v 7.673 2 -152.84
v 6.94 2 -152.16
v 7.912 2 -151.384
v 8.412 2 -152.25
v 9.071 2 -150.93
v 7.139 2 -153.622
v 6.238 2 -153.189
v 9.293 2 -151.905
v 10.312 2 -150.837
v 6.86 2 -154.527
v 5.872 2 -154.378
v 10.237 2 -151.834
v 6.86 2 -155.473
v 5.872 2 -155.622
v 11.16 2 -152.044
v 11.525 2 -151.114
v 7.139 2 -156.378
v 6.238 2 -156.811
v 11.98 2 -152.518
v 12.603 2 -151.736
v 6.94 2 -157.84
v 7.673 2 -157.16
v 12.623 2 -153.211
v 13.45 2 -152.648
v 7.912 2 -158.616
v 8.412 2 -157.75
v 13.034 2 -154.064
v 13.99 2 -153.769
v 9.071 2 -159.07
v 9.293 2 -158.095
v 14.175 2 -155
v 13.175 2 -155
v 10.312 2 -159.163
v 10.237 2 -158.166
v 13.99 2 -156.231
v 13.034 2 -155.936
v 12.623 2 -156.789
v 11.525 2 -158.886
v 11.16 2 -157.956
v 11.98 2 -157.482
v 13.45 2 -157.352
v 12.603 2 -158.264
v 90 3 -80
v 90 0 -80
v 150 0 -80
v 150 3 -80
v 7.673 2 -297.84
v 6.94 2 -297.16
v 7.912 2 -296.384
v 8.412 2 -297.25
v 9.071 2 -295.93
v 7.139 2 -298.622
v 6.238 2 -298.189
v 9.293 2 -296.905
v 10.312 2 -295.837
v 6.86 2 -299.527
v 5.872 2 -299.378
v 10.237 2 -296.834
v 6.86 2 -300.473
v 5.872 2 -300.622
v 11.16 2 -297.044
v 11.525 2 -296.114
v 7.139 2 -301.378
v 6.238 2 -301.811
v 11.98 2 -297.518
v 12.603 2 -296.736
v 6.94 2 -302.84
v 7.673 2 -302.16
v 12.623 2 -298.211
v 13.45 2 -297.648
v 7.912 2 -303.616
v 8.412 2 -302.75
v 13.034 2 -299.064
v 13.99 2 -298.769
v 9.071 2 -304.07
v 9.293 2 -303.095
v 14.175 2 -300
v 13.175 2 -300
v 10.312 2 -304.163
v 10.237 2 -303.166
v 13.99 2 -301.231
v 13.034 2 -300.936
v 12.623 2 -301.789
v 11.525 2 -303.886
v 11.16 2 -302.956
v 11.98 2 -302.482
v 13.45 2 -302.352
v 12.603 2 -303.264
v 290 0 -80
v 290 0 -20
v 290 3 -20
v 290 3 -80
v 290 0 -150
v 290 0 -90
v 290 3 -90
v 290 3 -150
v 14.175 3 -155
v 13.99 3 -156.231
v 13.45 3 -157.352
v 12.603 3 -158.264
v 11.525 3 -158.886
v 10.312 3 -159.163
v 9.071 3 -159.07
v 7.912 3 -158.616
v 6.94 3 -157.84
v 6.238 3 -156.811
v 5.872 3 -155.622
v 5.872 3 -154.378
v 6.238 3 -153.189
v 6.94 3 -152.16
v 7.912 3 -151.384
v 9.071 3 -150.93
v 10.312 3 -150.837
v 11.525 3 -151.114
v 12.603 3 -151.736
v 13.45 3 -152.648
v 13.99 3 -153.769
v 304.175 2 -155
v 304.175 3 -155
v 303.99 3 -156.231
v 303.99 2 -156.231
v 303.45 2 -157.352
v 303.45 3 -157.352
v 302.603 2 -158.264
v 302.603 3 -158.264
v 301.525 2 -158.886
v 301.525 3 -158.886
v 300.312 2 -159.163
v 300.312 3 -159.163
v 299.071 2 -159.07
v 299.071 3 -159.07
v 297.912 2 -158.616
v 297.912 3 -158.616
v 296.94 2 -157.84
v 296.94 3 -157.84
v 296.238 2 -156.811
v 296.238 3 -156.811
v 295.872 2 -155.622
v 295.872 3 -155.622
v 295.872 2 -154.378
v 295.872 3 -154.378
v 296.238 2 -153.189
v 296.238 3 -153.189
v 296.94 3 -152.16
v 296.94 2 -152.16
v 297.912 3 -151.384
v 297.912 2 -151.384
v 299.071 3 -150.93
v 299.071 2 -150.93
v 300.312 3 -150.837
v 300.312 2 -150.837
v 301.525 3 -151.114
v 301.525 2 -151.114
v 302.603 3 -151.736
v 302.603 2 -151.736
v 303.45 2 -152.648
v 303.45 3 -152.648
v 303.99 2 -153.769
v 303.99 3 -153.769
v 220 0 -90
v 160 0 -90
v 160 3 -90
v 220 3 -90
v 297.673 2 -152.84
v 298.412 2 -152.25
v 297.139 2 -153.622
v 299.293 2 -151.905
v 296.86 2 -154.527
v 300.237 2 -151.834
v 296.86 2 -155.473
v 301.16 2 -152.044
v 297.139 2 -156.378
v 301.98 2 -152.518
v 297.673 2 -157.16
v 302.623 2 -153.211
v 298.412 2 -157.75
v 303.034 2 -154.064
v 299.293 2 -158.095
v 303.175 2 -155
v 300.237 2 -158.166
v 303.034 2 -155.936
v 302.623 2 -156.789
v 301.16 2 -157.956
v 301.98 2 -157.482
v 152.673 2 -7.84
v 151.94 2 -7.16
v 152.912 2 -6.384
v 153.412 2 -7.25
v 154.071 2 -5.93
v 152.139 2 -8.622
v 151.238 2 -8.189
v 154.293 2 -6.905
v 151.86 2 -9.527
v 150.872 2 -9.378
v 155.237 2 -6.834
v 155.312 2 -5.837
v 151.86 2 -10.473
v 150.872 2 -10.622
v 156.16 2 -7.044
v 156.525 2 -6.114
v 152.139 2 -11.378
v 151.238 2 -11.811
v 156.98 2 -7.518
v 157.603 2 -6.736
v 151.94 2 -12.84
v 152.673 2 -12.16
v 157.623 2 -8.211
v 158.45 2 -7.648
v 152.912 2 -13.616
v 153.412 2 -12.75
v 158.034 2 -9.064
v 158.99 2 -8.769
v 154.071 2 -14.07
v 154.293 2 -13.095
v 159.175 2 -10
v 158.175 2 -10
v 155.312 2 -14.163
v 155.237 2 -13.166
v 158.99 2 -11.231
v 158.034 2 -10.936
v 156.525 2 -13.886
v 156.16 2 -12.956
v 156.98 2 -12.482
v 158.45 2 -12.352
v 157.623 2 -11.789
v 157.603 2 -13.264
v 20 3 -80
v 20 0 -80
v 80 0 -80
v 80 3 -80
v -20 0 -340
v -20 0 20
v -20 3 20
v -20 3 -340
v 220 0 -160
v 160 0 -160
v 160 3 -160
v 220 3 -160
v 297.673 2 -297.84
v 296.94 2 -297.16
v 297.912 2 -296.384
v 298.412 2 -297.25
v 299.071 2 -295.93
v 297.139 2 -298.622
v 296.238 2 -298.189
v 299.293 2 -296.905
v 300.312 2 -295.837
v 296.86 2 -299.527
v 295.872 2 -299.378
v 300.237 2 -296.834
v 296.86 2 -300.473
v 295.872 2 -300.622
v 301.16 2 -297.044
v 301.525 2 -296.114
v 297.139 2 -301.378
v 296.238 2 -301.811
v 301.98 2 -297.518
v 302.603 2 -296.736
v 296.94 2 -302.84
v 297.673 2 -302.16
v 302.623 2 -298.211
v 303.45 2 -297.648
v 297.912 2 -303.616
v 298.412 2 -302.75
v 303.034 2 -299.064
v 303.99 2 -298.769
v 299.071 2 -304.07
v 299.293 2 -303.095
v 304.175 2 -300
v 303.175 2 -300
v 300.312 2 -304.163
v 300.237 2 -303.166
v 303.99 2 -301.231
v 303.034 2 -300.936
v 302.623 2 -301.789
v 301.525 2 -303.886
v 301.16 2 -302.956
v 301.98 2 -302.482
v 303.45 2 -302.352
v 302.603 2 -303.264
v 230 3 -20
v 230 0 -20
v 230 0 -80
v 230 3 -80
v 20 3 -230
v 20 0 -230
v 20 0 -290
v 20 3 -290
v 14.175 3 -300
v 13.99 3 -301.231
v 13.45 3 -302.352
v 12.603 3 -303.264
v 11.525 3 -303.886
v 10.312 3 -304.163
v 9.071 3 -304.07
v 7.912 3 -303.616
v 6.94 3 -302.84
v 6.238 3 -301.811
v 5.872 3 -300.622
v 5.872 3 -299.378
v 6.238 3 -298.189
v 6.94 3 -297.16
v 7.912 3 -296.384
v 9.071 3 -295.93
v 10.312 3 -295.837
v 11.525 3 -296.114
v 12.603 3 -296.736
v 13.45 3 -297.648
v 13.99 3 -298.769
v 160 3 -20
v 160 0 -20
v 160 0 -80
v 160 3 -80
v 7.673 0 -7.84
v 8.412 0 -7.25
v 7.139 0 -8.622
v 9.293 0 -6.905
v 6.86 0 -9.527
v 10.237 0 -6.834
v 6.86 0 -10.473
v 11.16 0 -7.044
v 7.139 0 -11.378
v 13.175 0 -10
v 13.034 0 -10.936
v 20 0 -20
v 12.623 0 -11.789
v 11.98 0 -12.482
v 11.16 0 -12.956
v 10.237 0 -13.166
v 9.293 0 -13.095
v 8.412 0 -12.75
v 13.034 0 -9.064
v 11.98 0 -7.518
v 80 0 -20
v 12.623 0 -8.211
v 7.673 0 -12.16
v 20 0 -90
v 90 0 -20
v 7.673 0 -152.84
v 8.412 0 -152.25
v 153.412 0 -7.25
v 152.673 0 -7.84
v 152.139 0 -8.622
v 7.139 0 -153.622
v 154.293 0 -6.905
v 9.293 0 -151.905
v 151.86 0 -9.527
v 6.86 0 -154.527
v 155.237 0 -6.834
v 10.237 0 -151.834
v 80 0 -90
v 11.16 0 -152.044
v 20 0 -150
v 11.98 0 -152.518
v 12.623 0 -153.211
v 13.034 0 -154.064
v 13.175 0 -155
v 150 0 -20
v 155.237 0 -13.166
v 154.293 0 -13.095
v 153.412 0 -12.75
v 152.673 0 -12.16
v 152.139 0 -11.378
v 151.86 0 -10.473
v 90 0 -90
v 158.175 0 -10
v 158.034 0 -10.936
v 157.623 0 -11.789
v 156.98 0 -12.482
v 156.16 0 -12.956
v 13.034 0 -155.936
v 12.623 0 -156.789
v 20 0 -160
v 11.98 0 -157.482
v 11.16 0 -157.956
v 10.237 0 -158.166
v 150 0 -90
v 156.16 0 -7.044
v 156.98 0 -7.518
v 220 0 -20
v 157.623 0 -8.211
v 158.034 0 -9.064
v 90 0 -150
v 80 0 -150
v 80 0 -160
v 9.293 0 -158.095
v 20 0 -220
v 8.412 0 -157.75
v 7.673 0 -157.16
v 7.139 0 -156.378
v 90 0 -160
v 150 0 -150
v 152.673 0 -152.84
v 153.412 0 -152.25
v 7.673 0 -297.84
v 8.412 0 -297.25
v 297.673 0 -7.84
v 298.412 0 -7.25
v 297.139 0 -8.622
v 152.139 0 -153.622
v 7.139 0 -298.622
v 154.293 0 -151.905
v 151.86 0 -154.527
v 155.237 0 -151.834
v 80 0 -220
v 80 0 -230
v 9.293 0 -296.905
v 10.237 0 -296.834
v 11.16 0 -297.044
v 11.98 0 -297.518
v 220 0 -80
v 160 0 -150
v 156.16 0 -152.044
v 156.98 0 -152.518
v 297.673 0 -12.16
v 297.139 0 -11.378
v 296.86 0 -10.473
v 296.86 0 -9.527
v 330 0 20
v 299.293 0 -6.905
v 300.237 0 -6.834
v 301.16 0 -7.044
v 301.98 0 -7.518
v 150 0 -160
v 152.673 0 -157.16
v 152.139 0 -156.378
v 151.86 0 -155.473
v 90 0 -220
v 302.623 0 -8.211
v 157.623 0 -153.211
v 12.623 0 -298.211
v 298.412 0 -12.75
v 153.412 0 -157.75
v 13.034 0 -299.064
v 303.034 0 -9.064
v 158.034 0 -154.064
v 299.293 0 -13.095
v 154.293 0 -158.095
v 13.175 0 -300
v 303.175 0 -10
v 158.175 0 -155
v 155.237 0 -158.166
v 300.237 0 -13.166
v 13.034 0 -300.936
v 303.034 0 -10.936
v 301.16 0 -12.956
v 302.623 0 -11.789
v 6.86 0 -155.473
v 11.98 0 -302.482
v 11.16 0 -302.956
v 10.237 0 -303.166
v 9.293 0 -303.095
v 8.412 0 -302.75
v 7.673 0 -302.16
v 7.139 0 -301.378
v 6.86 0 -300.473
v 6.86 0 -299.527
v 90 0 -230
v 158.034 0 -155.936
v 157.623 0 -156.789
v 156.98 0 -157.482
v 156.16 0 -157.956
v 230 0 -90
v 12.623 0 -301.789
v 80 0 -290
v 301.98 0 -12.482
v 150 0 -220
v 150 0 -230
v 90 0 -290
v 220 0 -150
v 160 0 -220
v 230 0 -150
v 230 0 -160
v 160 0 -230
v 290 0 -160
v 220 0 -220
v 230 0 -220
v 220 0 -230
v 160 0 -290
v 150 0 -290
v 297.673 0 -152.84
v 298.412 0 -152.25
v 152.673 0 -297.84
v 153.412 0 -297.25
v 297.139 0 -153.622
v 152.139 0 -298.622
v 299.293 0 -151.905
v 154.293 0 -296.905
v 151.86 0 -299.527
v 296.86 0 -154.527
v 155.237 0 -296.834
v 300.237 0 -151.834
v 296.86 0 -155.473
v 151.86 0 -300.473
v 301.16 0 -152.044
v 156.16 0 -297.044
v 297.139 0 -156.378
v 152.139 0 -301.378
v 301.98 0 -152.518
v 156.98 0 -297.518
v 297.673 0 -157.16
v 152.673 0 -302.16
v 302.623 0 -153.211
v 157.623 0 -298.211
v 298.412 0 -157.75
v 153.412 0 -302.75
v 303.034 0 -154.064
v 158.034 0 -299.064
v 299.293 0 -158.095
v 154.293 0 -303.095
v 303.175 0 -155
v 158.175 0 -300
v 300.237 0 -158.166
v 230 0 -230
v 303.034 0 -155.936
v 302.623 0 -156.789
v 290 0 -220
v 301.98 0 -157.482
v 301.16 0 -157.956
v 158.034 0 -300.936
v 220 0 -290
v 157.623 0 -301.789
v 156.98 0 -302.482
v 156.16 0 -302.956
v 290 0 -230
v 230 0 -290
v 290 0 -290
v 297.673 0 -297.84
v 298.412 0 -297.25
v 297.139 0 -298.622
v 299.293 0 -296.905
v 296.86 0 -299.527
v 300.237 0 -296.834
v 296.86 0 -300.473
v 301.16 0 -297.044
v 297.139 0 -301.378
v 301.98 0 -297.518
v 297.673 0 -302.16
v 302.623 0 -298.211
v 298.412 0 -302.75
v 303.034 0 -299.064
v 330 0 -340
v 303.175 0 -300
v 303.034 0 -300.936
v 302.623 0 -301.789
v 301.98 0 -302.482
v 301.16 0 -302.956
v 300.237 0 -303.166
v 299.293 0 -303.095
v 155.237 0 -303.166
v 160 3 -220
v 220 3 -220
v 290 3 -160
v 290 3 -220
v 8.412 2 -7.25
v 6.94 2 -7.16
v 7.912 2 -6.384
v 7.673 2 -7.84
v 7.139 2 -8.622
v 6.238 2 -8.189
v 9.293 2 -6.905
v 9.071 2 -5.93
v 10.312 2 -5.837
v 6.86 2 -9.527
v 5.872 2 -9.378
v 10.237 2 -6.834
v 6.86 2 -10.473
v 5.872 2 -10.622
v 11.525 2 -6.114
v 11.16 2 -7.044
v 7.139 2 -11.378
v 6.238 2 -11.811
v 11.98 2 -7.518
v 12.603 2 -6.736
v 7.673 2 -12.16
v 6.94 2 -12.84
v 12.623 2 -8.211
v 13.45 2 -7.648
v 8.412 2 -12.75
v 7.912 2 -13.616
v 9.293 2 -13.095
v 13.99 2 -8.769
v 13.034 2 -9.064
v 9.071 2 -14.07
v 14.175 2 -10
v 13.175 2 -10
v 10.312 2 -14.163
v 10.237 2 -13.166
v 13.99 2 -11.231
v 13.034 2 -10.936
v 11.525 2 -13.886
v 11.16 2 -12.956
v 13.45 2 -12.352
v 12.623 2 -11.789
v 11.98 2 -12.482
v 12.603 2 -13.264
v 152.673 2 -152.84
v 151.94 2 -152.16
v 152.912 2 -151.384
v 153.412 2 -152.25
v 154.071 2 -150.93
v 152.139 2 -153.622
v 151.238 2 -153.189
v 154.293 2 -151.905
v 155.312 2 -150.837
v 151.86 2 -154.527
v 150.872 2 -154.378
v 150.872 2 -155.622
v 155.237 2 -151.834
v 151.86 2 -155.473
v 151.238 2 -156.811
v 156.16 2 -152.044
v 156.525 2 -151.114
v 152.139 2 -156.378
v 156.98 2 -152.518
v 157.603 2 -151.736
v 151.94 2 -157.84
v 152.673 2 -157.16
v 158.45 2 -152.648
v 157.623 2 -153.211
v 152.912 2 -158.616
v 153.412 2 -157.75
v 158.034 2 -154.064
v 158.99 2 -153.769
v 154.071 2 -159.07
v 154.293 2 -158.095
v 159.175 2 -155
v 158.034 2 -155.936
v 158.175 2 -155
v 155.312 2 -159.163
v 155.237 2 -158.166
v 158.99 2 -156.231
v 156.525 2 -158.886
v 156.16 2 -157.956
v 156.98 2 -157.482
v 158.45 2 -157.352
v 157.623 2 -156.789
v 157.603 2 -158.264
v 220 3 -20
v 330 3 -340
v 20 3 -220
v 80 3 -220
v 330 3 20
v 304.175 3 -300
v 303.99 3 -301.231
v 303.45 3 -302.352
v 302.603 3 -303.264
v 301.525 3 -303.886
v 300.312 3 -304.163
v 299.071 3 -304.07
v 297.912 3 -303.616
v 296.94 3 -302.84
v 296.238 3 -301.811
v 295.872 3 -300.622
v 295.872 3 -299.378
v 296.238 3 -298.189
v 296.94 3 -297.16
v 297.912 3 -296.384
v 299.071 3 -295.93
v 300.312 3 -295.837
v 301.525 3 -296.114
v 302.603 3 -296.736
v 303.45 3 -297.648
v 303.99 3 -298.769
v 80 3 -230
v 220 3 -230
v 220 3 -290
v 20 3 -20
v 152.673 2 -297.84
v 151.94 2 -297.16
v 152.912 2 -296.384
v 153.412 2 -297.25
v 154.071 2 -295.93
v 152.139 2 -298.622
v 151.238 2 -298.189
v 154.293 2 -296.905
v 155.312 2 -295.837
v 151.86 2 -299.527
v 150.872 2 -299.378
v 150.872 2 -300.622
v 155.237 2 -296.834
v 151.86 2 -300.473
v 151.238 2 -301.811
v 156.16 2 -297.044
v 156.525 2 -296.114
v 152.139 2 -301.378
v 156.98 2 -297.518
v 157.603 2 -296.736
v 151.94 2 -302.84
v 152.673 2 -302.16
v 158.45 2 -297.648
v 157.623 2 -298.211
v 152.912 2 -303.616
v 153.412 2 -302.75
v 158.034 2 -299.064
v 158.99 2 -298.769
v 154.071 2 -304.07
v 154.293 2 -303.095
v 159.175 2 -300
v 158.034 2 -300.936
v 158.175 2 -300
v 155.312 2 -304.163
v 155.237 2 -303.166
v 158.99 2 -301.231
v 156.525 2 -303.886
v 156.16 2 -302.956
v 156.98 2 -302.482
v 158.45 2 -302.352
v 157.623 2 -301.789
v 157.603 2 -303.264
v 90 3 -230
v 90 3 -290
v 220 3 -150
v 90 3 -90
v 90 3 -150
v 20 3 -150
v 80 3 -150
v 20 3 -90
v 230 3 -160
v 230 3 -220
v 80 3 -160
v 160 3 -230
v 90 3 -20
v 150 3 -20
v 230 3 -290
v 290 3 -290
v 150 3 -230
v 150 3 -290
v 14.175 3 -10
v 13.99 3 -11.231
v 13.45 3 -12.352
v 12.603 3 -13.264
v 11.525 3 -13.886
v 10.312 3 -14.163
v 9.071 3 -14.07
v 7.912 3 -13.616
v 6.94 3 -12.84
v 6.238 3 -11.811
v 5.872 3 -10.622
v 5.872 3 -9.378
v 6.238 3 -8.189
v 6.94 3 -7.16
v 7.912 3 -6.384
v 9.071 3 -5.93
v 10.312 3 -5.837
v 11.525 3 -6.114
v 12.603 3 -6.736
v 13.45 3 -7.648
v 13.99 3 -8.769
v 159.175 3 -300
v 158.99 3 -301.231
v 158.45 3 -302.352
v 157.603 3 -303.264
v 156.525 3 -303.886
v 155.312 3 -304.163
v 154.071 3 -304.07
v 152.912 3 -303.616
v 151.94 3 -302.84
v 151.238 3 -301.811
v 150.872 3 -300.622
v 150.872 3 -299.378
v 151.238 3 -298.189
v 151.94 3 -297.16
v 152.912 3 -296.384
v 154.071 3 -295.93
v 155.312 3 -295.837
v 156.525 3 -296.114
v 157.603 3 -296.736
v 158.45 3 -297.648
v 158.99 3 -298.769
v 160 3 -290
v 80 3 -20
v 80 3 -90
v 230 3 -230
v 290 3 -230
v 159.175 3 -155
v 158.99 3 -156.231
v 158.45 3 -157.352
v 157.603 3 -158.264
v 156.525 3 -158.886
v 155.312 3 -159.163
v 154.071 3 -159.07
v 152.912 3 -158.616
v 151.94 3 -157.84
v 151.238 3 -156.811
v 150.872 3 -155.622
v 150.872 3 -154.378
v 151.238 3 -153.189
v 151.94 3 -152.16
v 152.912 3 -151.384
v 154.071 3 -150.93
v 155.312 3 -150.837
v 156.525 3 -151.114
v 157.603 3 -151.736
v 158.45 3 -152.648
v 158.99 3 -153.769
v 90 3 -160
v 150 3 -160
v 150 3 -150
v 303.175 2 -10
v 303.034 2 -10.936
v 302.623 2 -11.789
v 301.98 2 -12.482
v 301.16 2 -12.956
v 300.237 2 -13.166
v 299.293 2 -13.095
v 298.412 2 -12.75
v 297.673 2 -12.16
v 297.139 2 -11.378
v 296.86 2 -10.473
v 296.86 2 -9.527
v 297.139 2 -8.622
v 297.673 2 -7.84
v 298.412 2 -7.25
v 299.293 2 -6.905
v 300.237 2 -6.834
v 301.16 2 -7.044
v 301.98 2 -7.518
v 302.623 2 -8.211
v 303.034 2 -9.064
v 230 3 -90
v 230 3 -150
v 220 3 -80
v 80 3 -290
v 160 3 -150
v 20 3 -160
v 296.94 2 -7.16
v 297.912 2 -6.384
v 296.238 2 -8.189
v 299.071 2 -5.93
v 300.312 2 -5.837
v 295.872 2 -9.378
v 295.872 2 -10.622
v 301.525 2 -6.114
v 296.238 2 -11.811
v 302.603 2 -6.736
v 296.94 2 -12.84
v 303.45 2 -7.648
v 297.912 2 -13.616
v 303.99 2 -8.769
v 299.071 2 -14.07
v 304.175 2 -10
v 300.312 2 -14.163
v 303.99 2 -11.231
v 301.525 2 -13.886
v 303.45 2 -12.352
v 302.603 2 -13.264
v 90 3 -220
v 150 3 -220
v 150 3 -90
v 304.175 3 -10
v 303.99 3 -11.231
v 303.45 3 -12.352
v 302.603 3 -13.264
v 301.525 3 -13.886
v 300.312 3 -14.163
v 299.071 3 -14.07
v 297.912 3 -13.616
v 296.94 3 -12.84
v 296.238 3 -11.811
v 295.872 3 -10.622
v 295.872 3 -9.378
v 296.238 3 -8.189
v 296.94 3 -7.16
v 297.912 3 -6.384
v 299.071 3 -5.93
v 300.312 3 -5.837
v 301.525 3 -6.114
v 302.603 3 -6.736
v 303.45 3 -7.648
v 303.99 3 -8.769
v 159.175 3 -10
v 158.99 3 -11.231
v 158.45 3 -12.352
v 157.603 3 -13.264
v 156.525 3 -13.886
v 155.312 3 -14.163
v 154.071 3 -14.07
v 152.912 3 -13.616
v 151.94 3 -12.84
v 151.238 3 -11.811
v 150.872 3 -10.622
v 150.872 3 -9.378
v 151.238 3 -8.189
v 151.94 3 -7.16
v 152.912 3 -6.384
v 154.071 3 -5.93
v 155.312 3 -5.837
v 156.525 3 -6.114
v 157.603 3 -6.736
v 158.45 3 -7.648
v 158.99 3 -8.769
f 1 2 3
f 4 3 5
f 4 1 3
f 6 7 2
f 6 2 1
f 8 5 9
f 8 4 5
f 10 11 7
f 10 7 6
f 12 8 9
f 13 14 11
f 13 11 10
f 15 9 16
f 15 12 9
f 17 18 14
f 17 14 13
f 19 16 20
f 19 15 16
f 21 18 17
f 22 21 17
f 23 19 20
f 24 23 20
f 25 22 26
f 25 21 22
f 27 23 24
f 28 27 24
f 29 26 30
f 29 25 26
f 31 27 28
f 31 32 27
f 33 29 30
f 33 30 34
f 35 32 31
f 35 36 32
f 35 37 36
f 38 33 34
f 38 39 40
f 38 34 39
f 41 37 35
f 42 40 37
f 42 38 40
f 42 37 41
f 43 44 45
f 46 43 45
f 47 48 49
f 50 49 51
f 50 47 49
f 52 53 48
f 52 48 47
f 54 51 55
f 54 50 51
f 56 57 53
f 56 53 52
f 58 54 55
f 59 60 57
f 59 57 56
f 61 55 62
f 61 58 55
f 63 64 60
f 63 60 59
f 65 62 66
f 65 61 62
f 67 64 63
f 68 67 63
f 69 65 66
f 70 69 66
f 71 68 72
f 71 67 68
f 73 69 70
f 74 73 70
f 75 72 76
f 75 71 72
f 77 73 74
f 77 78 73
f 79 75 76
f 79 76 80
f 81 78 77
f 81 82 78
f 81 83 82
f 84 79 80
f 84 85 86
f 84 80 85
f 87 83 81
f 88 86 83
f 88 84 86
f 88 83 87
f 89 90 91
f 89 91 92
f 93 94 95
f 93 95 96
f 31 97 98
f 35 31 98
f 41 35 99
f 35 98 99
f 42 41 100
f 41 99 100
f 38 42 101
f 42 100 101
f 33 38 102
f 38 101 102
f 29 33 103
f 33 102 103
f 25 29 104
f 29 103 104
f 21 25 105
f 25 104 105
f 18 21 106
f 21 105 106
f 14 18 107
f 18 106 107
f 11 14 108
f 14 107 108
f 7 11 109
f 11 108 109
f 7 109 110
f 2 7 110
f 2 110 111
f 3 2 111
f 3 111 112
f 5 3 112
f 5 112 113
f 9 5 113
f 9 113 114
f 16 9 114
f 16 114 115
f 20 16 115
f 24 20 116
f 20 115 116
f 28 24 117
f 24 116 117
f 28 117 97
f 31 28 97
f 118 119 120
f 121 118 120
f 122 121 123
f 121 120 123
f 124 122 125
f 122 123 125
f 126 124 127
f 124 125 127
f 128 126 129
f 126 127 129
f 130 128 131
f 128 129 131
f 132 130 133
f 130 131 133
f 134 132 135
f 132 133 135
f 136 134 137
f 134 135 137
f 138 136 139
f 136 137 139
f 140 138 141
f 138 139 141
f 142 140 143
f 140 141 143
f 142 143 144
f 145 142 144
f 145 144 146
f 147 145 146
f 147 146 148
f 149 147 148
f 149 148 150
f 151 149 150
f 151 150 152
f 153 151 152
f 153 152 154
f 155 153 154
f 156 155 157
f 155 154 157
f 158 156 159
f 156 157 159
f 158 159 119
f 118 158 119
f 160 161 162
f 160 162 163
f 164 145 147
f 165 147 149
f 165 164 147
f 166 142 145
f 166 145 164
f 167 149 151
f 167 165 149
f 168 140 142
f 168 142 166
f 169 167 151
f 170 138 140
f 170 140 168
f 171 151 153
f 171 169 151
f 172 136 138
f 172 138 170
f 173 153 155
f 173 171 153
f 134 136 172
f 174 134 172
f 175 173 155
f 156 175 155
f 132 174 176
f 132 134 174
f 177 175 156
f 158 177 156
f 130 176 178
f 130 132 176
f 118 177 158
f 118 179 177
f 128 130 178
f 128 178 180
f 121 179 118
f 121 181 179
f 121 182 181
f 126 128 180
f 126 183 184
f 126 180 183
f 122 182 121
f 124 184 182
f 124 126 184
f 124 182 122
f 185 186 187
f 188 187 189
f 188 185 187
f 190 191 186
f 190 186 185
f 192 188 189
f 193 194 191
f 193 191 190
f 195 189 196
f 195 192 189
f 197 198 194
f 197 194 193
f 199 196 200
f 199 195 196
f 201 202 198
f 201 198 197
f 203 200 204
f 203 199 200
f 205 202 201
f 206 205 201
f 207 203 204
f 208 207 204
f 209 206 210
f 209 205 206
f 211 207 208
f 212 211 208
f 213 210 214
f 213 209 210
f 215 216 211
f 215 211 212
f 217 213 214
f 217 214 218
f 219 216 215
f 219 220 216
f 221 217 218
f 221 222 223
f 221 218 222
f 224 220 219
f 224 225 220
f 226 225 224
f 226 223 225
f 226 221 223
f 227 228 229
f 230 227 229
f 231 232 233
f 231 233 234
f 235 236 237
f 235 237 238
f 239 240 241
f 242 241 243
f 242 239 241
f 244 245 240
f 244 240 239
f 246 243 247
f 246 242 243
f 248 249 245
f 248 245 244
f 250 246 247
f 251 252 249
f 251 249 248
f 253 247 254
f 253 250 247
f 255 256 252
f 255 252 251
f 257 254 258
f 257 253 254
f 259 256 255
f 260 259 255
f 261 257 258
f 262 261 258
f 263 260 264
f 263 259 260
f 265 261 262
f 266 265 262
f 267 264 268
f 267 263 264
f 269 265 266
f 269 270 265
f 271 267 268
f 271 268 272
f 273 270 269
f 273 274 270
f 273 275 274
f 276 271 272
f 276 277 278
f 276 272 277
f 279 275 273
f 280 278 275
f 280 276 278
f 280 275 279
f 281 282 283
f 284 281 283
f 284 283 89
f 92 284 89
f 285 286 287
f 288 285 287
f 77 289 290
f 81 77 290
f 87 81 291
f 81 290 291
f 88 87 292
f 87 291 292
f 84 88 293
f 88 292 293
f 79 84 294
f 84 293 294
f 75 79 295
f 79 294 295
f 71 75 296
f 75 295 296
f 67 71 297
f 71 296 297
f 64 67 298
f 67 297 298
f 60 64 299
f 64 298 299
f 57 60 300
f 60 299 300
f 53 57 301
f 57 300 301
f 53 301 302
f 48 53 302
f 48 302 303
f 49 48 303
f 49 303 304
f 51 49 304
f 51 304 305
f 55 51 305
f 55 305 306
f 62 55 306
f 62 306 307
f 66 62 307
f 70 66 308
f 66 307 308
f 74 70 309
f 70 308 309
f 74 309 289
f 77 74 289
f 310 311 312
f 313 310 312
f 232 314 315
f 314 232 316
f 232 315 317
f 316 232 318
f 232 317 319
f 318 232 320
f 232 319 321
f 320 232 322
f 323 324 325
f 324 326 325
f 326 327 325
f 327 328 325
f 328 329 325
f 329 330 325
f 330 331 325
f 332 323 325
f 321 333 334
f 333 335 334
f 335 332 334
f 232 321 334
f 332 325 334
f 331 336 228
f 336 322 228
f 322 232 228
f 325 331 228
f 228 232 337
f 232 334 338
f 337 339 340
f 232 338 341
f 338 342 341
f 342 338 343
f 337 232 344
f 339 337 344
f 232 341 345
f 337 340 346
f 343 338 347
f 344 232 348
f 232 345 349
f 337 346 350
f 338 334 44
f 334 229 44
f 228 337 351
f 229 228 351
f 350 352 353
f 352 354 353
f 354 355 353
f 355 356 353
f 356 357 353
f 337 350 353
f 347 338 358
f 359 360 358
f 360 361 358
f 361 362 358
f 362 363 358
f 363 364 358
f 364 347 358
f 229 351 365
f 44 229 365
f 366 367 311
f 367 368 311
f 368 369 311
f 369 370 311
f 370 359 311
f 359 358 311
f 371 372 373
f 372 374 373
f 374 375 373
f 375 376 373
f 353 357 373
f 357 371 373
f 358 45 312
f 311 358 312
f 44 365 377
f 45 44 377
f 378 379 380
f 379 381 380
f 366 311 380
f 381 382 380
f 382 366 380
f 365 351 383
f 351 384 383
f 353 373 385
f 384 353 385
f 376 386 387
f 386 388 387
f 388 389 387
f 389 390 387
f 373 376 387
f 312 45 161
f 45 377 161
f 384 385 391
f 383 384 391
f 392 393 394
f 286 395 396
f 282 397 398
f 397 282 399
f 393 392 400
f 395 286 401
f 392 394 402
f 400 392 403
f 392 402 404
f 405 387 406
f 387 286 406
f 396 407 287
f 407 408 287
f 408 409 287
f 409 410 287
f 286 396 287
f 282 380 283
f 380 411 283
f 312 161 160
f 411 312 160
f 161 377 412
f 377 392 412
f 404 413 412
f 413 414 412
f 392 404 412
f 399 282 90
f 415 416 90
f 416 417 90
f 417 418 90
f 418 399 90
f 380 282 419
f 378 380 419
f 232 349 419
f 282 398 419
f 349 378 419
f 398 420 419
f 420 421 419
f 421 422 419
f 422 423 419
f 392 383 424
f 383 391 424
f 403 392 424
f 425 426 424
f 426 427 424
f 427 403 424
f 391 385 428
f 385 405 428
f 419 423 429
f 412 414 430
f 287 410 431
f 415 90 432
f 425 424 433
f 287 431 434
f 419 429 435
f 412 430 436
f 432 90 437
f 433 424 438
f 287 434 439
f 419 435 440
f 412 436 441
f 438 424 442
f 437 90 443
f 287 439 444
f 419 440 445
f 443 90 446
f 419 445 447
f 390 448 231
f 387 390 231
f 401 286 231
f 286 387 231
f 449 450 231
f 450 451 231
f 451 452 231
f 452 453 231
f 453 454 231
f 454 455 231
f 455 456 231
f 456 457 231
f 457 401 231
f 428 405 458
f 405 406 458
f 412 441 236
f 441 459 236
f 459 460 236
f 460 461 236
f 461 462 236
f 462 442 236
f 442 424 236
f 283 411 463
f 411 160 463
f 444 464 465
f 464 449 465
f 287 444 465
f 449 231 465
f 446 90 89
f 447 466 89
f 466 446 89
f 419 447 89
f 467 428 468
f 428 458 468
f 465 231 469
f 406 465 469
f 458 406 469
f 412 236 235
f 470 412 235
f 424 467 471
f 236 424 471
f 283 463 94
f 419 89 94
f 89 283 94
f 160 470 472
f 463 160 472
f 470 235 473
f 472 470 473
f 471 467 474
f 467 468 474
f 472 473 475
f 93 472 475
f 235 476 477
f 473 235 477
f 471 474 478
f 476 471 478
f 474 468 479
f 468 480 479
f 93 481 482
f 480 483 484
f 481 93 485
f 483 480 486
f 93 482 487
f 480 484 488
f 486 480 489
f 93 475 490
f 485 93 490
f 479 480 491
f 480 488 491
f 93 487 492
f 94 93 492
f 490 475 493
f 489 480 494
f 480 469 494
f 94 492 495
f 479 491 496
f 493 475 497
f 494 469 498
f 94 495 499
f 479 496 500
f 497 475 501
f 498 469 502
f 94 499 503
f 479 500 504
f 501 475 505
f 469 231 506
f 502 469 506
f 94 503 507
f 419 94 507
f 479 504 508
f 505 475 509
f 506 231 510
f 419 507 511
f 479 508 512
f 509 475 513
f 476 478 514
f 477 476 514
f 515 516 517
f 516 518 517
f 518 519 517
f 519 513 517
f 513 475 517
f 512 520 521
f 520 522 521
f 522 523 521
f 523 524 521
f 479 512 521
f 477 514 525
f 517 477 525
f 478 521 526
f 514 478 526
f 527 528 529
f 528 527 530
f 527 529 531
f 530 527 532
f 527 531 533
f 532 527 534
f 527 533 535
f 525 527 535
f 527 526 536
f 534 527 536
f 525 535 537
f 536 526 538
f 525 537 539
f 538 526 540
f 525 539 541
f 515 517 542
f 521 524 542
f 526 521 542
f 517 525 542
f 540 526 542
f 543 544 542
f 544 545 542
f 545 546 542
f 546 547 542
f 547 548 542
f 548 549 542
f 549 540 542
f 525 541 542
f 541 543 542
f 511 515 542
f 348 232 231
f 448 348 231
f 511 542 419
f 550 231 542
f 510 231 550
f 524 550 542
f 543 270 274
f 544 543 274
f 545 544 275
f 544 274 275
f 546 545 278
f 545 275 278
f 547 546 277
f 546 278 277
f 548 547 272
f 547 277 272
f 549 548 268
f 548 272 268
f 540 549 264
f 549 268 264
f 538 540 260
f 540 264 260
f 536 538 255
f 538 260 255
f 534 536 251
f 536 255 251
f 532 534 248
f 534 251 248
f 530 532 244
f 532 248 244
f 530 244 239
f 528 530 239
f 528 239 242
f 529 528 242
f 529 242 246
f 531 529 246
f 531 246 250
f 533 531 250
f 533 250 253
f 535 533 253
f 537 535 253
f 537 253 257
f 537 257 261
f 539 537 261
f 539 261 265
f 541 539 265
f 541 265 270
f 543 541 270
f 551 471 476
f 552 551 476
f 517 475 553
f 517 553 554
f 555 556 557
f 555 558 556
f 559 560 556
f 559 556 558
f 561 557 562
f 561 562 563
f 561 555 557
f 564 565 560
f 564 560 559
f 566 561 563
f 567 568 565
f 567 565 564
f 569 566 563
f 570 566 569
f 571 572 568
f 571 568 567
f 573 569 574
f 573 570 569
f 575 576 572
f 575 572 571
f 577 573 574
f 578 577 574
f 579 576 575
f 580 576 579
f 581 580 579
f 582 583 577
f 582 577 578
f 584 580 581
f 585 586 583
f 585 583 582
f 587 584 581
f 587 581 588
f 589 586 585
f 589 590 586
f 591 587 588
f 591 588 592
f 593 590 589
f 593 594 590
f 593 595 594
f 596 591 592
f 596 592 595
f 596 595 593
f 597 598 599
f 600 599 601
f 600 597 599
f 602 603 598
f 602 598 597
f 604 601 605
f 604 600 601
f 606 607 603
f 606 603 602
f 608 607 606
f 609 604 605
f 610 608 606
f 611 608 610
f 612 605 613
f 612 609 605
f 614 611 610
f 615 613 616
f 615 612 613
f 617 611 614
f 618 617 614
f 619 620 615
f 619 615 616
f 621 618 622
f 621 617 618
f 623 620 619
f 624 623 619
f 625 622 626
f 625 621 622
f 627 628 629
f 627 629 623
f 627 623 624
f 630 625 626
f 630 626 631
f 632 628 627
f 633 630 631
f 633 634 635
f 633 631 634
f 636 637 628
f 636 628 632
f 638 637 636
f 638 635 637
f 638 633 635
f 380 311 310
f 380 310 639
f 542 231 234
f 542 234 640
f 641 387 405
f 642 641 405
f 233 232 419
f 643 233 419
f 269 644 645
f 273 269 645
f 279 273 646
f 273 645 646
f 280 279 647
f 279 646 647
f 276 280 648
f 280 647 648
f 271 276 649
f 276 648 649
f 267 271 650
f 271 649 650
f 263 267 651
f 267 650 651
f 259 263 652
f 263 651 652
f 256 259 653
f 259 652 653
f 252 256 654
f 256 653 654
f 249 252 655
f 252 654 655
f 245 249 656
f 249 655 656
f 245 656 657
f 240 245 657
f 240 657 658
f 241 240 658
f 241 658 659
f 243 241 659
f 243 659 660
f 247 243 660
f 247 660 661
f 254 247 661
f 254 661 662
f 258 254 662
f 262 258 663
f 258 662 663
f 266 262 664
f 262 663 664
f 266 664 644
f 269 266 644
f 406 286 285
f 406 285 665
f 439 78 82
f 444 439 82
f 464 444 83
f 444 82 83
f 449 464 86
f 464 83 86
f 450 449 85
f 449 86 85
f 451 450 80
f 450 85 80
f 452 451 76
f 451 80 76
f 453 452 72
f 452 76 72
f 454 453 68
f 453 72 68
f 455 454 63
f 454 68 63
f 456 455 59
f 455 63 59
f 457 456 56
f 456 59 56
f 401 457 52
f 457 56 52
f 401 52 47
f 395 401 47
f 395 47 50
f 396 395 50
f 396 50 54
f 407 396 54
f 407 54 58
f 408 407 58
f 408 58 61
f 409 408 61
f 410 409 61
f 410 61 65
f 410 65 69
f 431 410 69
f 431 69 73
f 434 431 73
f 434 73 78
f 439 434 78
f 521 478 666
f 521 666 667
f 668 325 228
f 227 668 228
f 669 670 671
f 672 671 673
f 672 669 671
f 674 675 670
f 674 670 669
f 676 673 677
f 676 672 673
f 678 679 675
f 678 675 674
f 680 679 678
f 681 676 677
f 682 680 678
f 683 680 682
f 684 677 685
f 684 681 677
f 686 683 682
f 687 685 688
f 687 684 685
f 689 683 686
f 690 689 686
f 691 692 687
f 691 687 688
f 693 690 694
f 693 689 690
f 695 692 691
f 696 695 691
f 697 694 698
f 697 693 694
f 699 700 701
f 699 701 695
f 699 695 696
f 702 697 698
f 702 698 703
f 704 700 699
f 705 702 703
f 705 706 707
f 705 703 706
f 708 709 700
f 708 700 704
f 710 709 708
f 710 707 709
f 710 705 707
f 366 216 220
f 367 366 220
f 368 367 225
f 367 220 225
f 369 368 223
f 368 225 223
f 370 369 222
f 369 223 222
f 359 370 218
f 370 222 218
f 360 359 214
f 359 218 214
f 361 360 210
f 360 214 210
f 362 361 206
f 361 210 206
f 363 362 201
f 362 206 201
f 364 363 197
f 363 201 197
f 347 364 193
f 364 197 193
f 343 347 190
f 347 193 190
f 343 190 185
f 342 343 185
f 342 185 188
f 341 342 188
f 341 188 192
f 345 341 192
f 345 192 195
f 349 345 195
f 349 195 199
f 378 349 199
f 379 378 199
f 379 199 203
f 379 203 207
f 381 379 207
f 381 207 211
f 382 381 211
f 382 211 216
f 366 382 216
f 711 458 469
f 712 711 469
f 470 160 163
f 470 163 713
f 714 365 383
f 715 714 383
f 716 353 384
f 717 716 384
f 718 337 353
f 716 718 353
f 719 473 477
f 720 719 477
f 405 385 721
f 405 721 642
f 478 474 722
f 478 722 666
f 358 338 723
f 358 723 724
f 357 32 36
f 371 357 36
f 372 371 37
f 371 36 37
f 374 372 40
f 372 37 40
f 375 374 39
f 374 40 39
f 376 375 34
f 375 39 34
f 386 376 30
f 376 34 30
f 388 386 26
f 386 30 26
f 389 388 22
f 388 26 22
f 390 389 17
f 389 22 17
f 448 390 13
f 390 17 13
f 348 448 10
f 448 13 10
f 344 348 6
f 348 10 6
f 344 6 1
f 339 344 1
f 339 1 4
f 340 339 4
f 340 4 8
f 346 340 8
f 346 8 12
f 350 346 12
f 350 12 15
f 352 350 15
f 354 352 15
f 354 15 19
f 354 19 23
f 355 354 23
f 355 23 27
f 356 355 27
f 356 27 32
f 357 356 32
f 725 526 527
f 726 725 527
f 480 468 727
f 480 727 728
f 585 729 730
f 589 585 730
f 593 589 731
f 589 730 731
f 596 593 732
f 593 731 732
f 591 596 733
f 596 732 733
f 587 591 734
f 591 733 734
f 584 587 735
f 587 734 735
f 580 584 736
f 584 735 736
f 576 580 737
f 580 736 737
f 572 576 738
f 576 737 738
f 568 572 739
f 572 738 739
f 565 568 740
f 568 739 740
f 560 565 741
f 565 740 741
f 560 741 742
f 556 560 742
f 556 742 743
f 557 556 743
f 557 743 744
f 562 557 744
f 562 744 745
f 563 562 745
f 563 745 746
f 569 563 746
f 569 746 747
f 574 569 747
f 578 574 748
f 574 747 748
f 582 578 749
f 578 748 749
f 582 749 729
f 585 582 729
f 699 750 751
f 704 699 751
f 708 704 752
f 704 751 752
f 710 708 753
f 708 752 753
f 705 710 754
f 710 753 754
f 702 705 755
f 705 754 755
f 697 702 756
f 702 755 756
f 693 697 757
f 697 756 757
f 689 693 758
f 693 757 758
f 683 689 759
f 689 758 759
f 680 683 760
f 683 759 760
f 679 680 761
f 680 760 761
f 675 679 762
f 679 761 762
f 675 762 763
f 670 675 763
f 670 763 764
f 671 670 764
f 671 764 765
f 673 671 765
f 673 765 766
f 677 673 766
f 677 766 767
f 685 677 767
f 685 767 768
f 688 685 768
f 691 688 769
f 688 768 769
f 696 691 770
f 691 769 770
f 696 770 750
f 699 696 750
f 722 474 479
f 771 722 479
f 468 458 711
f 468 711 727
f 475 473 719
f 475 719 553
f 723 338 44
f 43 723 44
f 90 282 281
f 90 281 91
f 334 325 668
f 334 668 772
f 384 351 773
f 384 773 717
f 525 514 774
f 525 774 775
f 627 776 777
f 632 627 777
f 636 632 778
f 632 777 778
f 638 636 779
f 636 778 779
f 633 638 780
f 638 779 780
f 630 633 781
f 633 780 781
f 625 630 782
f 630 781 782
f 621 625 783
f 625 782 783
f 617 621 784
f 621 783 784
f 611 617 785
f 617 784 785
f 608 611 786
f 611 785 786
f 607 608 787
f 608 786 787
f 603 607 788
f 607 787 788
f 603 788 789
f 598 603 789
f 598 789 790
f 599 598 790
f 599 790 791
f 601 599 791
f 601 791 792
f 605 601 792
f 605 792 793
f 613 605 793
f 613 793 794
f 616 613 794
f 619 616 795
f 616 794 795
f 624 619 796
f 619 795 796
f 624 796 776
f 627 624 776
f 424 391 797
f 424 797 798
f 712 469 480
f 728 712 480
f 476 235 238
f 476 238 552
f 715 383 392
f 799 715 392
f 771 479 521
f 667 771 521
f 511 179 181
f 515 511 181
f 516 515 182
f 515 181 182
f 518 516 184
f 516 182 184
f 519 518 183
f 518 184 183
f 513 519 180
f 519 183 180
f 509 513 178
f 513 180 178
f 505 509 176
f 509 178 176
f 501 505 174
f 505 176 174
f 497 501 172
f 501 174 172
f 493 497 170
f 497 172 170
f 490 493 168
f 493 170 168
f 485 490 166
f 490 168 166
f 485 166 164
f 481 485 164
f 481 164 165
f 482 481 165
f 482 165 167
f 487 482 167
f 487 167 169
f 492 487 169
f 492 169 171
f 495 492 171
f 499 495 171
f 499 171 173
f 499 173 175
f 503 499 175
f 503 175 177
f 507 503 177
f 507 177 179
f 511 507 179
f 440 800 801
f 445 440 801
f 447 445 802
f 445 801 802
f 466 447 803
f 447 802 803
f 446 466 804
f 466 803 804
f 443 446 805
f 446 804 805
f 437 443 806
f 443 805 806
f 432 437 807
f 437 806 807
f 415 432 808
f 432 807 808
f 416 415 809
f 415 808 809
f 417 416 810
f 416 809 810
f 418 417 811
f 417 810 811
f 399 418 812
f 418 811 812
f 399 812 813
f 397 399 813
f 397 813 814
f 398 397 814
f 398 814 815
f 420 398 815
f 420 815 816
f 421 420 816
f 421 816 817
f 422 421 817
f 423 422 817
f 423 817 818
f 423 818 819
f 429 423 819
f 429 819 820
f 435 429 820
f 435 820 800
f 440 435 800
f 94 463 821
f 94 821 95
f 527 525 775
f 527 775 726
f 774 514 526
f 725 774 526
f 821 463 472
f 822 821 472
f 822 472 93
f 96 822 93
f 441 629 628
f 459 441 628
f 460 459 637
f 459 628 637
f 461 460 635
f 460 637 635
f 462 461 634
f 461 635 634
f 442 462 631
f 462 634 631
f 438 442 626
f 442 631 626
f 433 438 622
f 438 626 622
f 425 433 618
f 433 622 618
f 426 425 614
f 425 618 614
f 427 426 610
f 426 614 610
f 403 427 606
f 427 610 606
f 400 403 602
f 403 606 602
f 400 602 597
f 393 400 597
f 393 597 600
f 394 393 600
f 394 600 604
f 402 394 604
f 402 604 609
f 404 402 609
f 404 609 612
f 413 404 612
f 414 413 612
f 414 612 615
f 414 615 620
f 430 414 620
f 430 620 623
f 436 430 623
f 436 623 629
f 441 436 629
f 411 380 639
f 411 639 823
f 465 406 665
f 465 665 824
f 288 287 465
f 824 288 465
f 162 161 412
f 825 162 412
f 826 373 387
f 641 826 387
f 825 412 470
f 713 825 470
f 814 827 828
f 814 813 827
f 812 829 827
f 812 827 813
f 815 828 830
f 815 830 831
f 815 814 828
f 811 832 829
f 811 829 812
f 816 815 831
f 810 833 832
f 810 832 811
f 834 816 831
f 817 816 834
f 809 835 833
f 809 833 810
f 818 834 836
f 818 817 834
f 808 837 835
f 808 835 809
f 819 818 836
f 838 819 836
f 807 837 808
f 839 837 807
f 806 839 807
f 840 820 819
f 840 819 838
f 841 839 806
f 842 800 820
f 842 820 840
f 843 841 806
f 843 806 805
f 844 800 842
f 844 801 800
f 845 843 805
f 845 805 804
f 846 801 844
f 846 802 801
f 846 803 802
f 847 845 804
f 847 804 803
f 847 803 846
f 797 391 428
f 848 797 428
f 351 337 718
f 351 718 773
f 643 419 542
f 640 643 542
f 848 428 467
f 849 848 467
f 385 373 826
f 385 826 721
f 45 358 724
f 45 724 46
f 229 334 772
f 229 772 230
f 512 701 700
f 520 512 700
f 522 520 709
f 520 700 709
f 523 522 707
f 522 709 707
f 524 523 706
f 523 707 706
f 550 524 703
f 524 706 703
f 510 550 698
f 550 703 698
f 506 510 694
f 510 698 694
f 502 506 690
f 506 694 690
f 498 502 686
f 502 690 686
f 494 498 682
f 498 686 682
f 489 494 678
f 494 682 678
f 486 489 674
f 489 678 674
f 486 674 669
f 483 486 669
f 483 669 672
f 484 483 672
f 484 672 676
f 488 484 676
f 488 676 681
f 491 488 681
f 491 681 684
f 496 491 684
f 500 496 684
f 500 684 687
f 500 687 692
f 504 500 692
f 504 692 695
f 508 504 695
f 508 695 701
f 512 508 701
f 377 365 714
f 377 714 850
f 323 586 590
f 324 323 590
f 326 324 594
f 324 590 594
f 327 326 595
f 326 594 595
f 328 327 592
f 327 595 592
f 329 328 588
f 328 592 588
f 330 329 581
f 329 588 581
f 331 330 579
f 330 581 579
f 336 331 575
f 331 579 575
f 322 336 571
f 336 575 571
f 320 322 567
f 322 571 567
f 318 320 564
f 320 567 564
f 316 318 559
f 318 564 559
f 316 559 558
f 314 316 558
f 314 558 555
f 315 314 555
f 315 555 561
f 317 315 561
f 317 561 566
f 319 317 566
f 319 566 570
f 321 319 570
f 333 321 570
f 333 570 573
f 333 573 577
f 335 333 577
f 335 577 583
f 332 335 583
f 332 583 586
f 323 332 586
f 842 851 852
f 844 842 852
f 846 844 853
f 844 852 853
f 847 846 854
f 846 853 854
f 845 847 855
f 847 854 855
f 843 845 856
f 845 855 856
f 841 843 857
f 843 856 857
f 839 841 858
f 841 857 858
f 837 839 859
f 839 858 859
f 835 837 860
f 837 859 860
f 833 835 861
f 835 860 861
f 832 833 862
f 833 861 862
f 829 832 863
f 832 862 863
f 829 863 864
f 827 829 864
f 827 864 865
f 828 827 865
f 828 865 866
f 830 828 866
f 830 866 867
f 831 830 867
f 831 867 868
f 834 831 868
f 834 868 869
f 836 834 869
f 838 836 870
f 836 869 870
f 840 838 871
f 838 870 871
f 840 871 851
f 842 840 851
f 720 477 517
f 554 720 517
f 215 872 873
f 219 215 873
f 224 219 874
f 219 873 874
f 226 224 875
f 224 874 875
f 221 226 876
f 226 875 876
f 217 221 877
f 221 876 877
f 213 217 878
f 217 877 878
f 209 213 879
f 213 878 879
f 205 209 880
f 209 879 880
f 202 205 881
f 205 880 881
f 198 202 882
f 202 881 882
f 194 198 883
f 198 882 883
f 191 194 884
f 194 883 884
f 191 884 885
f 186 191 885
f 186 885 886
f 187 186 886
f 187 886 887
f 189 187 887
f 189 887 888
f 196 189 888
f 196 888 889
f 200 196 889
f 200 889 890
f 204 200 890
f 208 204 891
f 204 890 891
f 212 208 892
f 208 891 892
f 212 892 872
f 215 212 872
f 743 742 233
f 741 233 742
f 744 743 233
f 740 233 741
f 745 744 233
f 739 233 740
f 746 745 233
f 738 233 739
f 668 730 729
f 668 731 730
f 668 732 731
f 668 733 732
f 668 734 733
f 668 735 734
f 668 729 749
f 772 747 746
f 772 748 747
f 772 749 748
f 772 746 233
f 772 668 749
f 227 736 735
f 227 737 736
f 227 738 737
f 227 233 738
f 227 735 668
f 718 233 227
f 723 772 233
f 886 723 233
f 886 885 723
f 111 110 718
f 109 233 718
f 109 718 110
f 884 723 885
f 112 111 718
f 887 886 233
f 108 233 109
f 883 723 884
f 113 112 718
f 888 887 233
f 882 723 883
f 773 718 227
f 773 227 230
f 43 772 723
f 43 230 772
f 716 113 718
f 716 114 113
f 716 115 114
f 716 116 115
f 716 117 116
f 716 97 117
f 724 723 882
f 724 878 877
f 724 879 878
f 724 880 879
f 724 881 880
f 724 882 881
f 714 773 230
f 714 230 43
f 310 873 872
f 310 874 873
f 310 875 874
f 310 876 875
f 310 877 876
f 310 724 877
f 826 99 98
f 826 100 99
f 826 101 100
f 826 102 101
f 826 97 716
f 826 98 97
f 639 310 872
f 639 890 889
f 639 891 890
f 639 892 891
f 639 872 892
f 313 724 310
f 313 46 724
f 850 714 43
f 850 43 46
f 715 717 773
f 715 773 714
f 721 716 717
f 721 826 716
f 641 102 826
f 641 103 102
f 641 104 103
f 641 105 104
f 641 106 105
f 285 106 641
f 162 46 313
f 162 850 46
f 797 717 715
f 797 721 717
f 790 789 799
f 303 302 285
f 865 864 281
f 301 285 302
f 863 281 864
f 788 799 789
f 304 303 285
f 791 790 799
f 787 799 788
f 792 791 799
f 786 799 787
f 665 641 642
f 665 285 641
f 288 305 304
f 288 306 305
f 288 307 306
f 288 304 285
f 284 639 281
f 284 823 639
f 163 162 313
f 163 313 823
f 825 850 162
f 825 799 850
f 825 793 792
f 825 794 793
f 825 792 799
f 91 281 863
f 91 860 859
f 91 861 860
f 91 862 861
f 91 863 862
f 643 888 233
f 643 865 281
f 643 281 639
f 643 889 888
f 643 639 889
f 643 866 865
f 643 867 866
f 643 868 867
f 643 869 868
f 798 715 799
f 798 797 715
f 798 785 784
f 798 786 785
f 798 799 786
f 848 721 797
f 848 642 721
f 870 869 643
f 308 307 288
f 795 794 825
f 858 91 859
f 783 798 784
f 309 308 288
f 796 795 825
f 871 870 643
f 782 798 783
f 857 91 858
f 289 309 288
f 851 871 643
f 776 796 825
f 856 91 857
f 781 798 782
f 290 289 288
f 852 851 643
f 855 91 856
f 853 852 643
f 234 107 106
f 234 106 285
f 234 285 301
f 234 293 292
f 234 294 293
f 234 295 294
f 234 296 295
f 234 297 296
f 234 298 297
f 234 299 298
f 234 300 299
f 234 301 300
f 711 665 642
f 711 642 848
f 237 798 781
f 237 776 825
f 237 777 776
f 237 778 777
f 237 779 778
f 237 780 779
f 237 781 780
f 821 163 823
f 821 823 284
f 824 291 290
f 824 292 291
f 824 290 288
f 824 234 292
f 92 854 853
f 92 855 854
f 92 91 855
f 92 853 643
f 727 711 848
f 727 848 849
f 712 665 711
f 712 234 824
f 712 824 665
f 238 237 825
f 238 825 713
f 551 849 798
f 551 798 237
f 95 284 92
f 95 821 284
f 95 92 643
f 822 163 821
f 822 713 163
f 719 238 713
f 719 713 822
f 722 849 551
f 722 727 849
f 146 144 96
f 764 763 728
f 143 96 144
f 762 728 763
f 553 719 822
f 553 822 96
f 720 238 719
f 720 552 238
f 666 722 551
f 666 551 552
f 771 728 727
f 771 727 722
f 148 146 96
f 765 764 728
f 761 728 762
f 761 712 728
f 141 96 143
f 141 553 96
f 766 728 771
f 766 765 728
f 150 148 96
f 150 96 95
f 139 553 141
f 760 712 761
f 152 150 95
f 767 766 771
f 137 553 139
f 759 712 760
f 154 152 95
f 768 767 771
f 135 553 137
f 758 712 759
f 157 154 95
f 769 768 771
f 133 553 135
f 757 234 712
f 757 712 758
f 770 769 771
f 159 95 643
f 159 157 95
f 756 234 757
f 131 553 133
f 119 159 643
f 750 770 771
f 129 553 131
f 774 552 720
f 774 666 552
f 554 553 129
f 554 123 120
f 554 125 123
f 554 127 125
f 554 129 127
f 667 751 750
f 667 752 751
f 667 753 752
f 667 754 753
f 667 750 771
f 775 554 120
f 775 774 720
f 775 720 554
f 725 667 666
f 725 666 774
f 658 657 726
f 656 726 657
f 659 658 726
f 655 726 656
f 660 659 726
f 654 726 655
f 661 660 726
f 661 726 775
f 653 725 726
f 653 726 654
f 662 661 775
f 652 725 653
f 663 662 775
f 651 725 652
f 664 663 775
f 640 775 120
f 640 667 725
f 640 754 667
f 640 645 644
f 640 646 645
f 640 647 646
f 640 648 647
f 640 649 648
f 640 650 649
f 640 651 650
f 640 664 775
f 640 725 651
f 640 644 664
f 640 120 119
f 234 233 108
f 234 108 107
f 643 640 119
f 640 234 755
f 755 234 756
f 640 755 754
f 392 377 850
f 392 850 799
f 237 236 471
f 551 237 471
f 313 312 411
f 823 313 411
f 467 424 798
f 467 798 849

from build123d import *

# Parameters (mm, degrees)
ESQUISSE1_W                     = 350
ESQUISSE1_H                     = 360
ESQUISSE1_W_2                   = 60
ESQUISSE1_H_2                   = 60
BOSS_EXTRU_1_DEPTH              = 3
ESQUISSE2_R                     = 3.175
ENL_V_MAT_EXTRU_1_DEPTH         = 5
ESQUISSE2_2_R                   = 4.175
ESQUISSE2_2_R_2                 = 3.175
ENL_V_DE_MAT_EXTRU_MINCE1_DEPTH = 1


with BuildPart() as part:
    # Esquisse1 → Boss.-Extru.1 (new body)
    with BuildSketch(Plane(origin=(0, 0, 0), x_dir=(1, 0, 0), z_dir=(0, 1, 0))):
        with Locations((155, 160)):
            Rectangle(ESQUISSE1_W, ESQUISSE1_H)
        with Locations((50, 50)):
            Rectangle(ESQUISSE1_W_2, ESQUISSE1_H_2, mode=Mode.SUBTRACT)
        with Locations((120, 50)):
            Rectangle(ESQUISSE1_W_2, ESQUISSE1_H_2, mode=Mode.SUBTRACT)
        with Locations((50, 120)):
            Rectangle(ESQUISSE1_W_2, ESQUISSE1_H_2, mode=Mode.SUBTRACT)
        with Locations((120, 120)):
            Rectangle(ESQUISSE1_W_2, ESQUISSE1_H_2, mode=Mode.SUBTRACT)
        with Locations((190, 50)):
            Rectangle(ESQUISSE1_W_2, ESQUISSE1_H_2, mode=Mode.SUBTRACT)
        with Locations((260, 50)):
            Rectangle(ESQUISSE1_W_2, ESQUISSE1_H_2, mode=Mode.SUBTRACT)
        with Locations((190, 120)):
            Rectangle(ESQUISSE1_W_2, ESQUISSE1_H_2, mode=Mode.SUBTRACT)
        with Locations((260, 120)):
            Rectangle(ESQUISSE1_W_2, ESQUISSE1_H_2, mode=Mode.SUBTRACT)
        with Locations((50, 190)):
            Rectangle(ESQUISSE1_W_2, ESQUISSE1_H_2, mode=Mode.SUBTRACT)
        with Locations((120, 190)):
            Rectangle(ESQUISSE1_W_2, ESQUISSE1_H_2, mode=Mode.SUBTRACT)
        with Locations((50, 260)):
            Rectangle(ESQUISSE1_W_2, ESQUISSE1_H_2, mode=Mode.SUBTRACT)
        with Locations((120, 260)):
            Rectangle(ESQUISSE1_W_2, ESQUISSE1_H_2, mode=Mode.SUBTRACT)
        with Locations((190, 190)):
            Rectangle(ESQUISSE1_W_2, ESQUISSE1_H_2, mode=Mode.SUBTRACT)
        with Locations((260, 190)):
            Rectangle(ESQUISSE1_W_2, ESQUISSE1_H_2, mode=Mode.SUBTRACT)
        with Locations((190, 260)):
            Rectangle(ESQUISSE1_W_2, ESQUISSE1_H_2, mode=Mode.SUBTRACT)
        with Locations((260, 260)):
            Rectangle(ESQUISSE1_W_2, ESQUISSE1_H_2, mode=Mode.SUBTRACT)
    extrude(amount=BOSS_EXTRU_1_DEPTH)

    # Esquisse2 → Enl_v. mat.-Extru.1 (cut)
    with BuildSketch(Plane(origin=(0, 3, 0), x_dir=(1, 0, 0), z_dir=(0, 1, 0))):
        with Locations((155, 300)):
            Circle(ESQUISSE2_R)
        with Locations((10, 300)):
            Circle(ESQUISSE2_R)
        with Locations((155, 155)):
            Circle(ESQUISSE2_R)
        with Locations((300, 300)):
            Circle(ESQUISSE2_R)
        with Locations((300, 155)):
            Circle(ESQUISSE2_R)
        with Locations((10, 155)):
            Circle(ESQUISSE2_R)
        with Locations((10, 10)):
            Circle(ESQUISSE2_R)
        with Locations((300, 10)):
            Circle(ESQUISSE2_R)
        with Locations((155, 10)):
            Circle(ESQUISSE2_R)
    extrude(amount=-ENL_V_MAT_EXTRU_1_DEPTH, mode=Mode.SUBTRACT)

    # Esquisse2_2 → Enl_v. de mat.-Extru.-Mince1 (cut)
    # profile 1 of 9: a face of its own
    with BuildSketch(Plane(origin=(0, 3, 0), x_dir=(1, 0, 0), z_dir=(0, 1, 0))):
        with Locations((155, 300)):
            Circle(ESQUISSE2_2_R)
        with Locations((155, 300)):
            Circle(ESQUISSE2_2_R_2, mode=Mode.SUBTRACT)
    # profile 2 of 9: a face of its own
    with BuildSketch(Plane(origin=(0, 3, 0), x_dir=(1, 0, 0), z_dir=(0, 1, 0))):
        with Locations((10, 300)):
            Circle(ESQUISSE2_2_R)
        with Locations((10, 300)):
            Circle(ESQUISSE2_2_R_2, mode=Mode.SUBTRACT)
    # profile 3 of 9: a face of its own
    with BuildSketch(Plane(origin=(0, 3, 0), x_dir=(1, 0, 0), z_dir=(0, 1, 0))):
        with Locations((155, 155)):
            Circle(ESQUISSE2_2_R)
        with Locations((155, 155)):
            Circle(ESQUISSE2_2_R_2, mode=Mode.SUBTRACT)
    # profile 4 of 9: a face of its own
    with BuildSketch(Plane(origin=(0, 3, 0), x_dir=(1, 0, 0), z_dir=(0, 1, 0))):
        with Locations((300, 300)):
            Circle(ESQUISSE2_2_R)
        with Locations((300, 300)):
            Circle(ESQUISSE2_2_R_2, mode=Mode.SUBTRACT)
    # profile 5 of 9: a face of its own
    with BuildSketch(Plane(origin=(0, 3, 0), x_dir=(1, 0, 0), z_dir=(0, 1, 0))):
        with Locations((300, 155)):
            Circle(ESQUISSE2_2_R)
        with Locations((300, 155)):
            Circle(ESQUISSE2_2_R_2, mode=Mode.SUBTRACT)
    # profile 6 of 9: a face of its own
    with BuildSketch(Plane(origin=(0, 3, 0), x_dir=(1, 0, 0), z_dir=(0, 1, 0))):
        with Locations((10, 155)):
            Circle(ESQUISSE2_2_R)
        with Locations((10, 155)):
            Circle(ESQUISSE2_2_R_2, mode=Mode.SUBTRACT)
    # profile 7 of 9: a face of its own
    with BuildSketch(Plane(origin=(0, 3, 0), x_dir=(1, 0, 0), z_dir=(0, 1, 0))):
        with Locations((10, 10)):
            Circle(ESQUISSE2_2_R)
        with Locations((10, 10)):
            Circle(ESQUISSE2_2_R_2, mode=Mode.SUBTRACT)
    # profile 8 of 9: a face of its own
    with BuildSketch(Plane(origin=(0, 3, 0), x_dir=(1, 0, 0), z_dir=(0, 1, 0))):
        with Locations((300, 10)):
            Circle(ESQUISSE2_2_R)
        with Locations((300, 10)):
            Circle(ESQUISSE2_2_R_2, mode=Mode.SUBTRACT)
    # profile 9 of 9: a face of its own
    with BuildSketch(Plane(origin=(0, 3, 0), x_dir=(1, 0, 0), z_dir=(0, 1, 0))):
        with Locations((155, 10)):
            Circle(ESQUISSE2_2_R)
        with Locations((155, 10)):
            Circle(ESQUISSE2_2_R_2, mode=Mode.SUBTRACT)
    extrude(amount=-ENL_V_DE_MAT_EXTRU_MINCE1_DEPTH, mode=Mode.SUBTRACT)


solid = part.part
